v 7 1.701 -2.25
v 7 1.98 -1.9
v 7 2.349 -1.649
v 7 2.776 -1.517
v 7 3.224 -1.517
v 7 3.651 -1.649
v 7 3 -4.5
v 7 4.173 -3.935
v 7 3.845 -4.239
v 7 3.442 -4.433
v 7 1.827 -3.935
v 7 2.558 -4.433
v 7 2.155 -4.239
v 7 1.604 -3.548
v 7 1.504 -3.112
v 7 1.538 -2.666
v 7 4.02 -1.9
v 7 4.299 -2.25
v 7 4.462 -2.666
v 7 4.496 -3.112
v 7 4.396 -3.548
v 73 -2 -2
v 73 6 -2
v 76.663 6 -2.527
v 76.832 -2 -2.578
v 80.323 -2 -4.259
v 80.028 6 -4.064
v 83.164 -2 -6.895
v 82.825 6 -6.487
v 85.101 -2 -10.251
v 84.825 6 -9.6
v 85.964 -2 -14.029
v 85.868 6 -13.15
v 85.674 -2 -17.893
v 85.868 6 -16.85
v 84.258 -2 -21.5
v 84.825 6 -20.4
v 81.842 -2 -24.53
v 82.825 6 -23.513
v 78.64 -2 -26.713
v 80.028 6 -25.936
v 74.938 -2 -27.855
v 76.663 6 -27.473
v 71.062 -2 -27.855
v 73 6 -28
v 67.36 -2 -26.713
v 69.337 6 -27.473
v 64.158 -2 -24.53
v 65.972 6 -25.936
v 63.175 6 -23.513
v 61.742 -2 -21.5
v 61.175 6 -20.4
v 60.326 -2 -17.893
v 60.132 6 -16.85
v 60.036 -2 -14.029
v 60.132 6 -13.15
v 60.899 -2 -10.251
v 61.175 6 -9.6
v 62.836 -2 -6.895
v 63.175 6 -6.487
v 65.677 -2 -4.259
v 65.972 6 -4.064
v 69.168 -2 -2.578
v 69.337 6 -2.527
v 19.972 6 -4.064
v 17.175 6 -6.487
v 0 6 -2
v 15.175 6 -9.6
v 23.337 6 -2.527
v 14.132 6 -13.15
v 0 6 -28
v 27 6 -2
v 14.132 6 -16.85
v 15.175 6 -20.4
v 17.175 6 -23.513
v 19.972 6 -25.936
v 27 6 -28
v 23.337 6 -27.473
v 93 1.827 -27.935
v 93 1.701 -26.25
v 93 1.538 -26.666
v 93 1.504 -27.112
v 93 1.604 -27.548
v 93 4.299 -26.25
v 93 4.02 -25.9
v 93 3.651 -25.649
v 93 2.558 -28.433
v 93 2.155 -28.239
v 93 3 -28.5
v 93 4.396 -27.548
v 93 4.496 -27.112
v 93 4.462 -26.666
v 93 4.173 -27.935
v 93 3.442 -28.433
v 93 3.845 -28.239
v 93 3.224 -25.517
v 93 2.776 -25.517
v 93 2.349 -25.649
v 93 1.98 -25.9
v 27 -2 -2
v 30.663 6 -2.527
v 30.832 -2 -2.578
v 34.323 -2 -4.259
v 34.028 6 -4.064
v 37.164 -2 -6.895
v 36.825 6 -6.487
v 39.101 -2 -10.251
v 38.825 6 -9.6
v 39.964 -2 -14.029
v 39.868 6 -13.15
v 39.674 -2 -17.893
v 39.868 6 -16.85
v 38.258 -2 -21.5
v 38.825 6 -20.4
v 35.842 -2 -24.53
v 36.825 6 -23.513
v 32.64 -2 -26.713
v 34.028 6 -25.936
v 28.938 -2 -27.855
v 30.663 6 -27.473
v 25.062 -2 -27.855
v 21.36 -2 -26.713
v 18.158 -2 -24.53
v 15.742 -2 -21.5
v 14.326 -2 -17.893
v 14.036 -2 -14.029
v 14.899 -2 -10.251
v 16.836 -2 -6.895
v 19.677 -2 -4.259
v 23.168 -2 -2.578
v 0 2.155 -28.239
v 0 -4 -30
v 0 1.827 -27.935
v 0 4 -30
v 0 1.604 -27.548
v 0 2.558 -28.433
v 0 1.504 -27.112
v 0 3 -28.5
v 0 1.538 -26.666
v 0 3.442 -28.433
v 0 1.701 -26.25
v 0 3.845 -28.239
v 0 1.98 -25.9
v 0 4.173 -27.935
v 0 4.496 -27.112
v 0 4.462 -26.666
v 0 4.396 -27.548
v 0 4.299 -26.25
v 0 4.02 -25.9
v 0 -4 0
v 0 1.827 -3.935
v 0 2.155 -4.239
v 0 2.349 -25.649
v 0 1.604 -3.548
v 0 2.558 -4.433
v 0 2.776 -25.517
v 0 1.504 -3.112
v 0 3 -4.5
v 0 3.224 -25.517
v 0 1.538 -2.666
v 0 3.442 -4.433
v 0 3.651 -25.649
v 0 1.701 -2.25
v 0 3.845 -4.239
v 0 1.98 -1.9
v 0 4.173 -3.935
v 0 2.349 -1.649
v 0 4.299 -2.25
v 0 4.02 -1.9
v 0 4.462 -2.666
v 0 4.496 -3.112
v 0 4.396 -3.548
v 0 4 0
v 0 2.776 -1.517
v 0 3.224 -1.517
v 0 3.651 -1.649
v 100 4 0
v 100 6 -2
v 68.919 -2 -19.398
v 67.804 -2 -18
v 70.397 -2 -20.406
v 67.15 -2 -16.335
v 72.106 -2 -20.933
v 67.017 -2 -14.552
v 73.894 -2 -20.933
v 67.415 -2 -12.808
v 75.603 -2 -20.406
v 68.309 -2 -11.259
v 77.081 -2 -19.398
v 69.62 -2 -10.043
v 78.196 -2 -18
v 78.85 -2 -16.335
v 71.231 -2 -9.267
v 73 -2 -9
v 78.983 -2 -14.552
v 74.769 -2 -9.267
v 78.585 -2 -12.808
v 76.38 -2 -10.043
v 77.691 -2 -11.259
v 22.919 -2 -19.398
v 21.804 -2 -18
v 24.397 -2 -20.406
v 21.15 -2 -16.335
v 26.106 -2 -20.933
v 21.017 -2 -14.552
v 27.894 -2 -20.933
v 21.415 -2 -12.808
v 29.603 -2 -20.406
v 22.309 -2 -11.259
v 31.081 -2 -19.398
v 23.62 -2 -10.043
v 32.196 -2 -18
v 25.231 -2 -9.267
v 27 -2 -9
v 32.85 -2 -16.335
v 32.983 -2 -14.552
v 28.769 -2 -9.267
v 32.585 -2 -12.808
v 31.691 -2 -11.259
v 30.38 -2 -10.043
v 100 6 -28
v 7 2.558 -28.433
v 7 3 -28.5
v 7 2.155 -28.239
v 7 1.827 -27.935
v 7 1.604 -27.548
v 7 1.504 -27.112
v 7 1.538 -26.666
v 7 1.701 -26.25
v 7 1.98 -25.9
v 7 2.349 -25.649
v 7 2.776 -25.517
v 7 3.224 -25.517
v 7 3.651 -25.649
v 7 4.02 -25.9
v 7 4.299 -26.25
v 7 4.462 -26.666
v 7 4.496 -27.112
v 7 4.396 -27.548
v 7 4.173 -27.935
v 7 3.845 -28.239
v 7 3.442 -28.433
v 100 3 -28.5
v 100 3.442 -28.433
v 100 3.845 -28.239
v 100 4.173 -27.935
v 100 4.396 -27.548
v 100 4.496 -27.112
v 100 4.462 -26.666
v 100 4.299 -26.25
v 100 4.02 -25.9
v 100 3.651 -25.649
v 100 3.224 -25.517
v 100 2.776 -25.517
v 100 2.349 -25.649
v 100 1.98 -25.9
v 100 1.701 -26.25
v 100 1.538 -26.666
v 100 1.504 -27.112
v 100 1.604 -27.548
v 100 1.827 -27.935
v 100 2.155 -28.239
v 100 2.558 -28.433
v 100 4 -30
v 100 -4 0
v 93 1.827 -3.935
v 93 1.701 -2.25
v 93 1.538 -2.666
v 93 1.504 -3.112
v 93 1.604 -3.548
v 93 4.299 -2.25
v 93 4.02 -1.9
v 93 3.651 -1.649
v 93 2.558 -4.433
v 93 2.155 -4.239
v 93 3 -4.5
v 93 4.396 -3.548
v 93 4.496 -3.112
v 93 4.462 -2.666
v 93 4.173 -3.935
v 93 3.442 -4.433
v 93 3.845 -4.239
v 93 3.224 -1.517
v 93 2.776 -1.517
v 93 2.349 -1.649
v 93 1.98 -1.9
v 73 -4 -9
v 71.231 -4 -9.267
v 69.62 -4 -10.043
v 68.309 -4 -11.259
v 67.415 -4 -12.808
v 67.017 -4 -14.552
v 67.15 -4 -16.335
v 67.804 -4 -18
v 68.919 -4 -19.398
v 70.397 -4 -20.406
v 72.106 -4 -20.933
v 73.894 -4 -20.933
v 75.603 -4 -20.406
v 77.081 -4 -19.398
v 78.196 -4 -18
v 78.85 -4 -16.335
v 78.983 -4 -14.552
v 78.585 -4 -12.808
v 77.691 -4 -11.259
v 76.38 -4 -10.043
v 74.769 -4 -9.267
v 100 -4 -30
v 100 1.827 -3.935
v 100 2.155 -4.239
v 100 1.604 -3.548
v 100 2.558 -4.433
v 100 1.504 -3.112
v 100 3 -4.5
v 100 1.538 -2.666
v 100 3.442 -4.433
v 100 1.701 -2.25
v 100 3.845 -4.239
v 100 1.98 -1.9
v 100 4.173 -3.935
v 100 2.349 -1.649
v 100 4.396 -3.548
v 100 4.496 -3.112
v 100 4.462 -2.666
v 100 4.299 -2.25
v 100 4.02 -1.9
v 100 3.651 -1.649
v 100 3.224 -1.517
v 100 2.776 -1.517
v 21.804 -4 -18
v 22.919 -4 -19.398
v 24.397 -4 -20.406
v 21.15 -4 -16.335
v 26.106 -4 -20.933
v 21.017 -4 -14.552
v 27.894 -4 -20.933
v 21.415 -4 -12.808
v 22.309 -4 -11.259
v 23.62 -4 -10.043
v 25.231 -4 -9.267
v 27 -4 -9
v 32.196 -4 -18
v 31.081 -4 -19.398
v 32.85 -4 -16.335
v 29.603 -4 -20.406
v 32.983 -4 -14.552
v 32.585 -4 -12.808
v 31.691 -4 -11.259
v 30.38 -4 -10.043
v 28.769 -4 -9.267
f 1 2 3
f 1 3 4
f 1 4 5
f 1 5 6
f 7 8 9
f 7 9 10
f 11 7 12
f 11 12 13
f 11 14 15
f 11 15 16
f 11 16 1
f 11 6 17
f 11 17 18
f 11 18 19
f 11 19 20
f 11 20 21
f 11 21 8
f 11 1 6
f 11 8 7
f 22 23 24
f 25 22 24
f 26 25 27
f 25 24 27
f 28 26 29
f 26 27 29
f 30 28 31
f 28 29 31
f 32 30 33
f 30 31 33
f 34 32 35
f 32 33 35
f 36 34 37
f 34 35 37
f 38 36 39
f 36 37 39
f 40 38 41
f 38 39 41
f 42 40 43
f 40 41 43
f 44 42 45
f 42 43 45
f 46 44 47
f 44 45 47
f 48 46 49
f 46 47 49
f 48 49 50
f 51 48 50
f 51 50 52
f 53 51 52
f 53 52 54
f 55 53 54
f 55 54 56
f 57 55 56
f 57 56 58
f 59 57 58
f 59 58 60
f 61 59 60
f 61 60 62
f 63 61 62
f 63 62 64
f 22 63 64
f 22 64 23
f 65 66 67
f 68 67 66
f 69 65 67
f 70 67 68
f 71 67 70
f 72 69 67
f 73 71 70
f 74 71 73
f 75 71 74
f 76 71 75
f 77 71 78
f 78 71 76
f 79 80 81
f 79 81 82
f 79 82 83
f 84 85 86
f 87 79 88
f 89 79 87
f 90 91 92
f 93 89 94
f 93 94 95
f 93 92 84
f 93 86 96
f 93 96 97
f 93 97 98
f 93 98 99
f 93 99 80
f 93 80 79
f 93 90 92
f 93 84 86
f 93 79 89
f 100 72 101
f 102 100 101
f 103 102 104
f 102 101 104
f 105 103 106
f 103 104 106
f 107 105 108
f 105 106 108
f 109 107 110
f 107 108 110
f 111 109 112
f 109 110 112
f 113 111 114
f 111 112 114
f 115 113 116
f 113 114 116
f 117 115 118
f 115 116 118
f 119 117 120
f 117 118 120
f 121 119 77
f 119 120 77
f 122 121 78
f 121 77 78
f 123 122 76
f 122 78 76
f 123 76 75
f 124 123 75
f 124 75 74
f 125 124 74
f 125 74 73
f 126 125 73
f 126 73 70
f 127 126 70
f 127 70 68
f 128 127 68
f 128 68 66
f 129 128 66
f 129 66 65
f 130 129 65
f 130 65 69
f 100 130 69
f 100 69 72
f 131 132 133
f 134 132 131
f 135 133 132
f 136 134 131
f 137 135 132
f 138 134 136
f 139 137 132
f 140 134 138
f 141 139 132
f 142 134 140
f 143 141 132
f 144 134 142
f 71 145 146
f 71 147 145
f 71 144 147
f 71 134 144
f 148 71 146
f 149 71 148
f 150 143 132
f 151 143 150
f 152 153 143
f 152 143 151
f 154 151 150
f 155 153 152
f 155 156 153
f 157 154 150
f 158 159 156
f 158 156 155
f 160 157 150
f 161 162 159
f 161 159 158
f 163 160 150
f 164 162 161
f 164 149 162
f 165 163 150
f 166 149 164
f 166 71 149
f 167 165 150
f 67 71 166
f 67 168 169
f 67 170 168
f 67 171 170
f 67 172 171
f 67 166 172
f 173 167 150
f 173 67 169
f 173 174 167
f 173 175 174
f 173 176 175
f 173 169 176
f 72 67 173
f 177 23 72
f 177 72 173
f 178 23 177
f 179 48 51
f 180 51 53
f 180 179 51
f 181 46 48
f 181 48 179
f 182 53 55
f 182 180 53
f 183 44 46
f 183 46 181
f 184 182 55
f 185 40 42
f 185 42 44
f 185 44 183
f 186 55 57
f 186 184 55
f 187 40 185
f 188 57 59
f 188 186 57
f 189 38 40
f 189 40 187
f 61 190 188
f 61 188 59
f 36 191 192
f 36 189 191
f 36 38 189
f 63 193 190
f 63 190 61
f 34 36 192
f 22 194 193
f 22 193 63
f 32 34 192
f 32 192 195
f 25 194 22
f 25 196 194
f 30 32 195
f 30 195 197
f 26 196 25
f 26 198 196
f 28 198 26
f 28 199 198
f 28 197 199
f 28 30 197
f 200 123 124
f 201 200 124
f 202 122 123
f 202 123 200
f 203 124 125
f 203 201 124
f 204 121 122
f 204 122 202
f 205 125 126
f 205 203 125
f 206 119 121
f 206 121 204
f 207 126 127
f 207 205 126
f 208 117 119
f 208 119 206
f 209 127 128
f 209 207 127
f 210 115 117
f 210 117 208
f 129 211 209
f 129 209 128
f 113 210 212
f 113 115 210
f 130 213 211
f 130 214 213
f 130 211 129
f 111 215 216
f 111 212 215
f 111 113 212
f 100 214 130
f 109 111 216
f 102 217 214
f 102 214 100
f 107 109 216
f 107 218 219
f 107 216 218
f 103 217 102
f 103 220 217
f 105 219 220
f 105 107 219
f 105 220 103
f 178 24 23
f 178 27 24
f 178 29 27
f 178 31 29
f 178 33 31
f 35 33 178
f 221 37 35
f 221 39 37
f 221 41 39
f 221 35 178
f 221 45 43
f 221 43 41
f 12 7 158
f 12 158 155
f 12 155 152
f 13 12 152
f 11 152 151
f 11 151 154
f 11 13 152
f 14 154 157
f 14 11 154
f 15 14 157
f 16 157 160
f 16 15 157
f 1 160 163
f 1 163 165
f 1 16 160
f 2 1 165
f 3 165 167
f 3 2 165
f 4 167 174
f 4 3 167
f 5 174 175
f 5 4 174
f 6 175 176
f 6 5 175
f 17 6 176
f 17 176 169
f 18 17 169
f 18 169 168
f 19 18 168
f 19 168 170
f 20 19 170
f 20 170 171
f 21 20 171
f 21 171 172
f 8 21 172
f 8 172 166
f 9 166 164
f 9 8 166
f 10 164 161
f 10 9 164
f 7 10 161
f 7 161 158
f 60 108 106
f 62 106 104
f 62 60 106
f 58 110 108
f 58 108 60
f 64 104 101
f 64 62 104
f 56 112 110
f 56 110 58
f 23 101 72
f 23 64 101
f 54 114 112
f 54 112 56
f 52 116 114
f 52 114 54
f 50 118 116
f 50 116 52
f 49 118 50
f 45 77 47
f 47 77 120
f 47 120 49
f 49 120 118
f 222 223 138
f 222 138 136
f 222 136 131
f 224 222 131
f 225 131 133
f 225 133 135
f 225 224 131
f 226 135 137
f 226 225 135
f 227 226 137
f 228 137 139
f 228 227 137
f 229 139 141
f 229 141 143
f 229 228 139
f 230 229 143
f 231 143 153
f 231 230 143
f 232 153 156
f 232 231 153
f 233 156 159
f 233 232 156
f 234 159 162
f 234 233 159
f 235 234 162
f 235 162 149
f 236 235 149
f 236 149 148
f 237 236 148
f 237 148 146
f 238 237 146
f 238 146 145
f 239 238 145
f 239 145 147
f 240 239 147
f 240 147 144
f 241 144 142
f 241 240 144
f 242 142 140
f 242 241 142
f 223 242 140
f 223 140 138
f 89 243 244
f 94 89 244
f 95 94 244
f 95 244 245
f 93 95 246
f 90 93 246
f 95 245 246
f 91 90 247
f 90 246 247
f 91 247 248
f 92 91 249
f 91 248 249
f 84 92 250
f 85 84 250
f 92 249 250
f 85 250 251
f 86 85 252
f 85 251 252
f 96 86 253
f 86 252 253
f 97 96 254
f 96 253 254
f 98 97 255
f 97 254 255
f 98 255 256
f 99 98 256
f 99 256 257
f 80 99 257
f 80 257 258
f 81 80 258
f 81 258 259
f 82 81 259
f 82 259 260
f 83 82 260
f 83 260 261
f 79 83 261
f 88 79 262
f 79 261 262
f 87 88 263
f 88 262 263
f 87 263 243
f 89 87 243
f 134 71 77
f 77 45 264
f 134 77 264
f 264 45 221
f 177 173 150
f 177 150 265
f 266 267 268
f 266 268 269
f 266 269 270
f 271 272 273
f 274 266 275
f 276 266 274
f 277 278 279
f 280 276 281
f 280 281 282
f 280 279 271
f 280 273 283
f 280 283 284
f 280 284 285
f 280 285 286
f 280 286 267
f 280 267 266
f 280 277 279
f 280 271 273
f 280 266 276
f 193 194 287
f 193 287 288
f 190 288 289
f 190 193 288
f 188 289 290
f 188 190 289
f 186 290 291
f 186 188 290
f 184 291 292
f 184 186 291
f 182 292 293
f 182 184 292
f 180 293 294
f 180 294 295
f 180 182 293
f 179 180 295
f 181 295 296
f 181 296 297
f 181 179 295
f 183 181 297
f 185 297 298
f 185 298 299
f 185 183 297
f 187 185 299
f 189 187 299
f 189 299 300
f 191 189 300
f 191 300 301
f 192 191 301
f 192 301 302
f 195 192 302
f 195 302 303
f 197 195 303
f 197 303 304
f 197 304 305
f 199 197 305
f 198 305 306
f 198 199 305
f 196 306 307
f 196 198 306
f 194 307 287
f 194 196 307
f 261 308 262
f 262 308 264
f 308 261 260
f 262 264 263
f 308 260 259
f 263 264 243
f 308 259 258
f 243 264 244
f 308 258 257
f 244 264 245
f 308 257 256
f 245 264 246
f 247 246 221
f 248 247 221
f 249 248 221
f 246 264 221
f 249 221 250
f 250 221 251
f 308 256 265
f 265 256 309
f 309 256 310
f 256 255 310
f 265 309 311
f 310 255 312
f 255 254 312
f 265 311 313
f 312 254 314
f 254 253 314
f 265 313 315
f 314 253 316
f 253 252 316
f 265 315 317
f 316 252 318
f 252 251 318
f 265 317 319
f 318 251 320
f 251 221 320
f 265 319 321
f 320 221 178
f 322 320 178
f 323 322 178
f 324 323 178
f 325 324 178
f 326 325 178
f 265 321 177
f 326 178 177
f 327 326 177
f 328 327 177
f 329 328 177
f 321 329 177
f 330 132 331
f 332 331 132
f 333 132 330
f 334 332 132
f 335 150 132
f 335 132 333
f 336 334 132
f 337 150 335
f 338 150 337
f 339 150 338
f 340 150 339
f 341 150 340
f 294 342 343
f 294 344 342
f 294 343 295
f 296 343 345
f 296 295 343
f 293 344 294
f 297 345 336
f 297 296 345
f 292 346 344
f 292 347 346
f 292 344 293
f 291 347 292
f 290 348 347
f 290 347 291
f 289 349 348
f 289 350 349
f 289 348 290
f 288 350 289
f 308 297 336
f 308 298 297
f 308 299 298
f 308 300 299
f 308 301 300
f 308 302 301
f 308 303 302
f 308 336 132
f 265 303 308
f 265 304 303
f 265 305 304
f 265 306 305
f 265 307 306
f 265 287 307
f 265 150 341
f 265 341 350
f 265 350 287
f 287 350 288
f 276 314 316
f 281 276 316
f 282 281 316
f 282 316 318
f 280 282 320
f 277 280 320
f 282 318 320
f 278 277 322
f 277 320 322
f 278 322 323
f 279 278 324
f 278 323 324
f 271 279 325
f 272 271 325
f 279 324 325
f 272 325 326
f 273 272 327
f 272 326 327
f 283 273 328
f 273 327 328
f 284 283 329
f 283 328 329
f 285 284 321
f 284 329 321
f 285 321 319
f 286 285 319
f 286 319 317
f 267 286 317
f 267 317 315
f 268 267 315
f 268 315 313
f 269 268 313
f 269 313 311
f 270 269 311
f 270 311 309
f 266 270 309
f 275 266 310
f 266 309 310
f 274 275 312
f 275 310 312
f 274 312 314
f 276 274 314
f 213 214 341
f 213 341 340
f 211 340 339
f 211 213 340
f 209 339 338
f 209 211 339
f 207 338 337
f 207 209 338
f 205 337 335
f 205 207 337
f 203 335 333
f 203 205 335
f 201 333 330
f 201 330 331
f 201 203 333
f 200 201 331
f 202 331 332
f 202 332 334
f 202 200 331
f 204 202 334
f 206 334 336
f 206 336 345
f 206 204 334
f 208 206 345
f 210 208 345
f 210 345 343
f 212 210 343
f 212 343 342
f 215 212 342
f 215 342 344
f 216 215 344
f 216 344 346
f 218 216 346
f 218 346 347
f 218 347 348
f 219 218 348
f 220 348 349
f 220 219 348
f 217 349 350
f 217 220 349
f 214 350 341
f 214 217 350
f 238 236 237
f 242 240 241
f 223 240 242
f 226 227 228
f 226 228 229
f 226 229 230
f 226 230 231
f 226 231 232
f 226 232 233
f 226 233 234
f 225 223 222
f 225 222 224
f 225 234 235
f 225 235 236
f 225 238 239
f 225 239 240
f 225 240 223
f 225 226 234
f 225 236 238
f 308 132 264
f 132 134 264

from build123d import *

# Parameters (mm, degrees)
SKETCH1_W           = 100
SKETCH1_H           = 30
BOSS_EXTRUDE1_DEPTH = 6
SKETCH2_R           = 6
CUT_EXTRUDE1_DEPTH  = 105.575331699
CHAMFER1_SIZE       = 2
SKETCH3_R           = 1.5
CUT_EXTRUDE2_DEPTH  = 7
CUT_EXTRUDE3_START  = -7
SKETCH4_R           = 1.5
CUT_EXTRUDE3_DEPTH  = 7
SKETCH5_W           = 100
SKETCH5_H           = 30
SKETCH5_R           = 6
BOSS_EXTRUDE2_DEPTH = 4
SKETCH6_R           = 13
CUT_EXTRUDE4_DEPTH  = 8


with BuildPart() as part:
    # Sketch1 → Boss-Extrude1 (new body)
    with BuildSketch(Plane(origin=(0, 0, 0), x_dir=(1, 0, 0), z_dir=(0, 1, 0))):
        with Locations((50, 15)):
            Rectangle(SKETCH1_W, SKETCH1_H)
    extrude(amount=BOSS_EXTRUDE1_DEPTH)

    # Sketch2 → Cut-Extrude1 (cut, through all)
    with BuildSketch(Plane(origin=(0, 6, 0), x_dir=(1, 0, 0), z_dir=(0, 1, 0))):
        with Locations(Location((27, 15, 0), (0, 0, 270))):
            Circle(SKETCH2_R)
        with Locations(Location((73, 15, 0), (0, 0, 270))):
            Circle(SKETCH2_R)
    extrude(amount=-CUT_EXTRUDE1_DEPTH, mode=Mode.SUBTRACT)

    # Chamfer1
    chamfer1_edges = [part.edges().sort_by_distance(p)[0] for p in [
        (50, 6, -30),
        (50, 6, 0),
    ]]
    chamfer(chamfer1_edges, length=CHAMFER1_SIZE)

    # Sketch3 → Cut-Extrude2 (cut)
    with BuildSketch(Plane(origin=(100, 0, 0), x_dir=(0, 0, -1), z_dir=(1, 0, 0))):
        with Locations((3, 3)):
            Circle(SKETCH3_R)
        with Locations((27, 3)):
            Circle(SKETCH3_R)
    extrude(amount=-CUT_EXTRUDE2_DEPTH, mode=Mode.SUBTRACT)

    # Sketch4 → Cut-Extrude3 (cut)
    with BuildSketch(Plane.ZY.offset(CUT_EXTRUDE3_START)):
        with Locations(Location((-27, 3, 0), (0, 0, 180))):
            Circle(SKETCH4_R)
        with Locations(Location((-3, 3, 0), (0, 0, 180))):
            Circle(SKETCH4_R)
    extrude(amount=CUT_EXTRUDE3_DEPTH, mode=Mode.SUBTRACT)

    # Sketch5 → Boss-Extrude2 (add)
    with BuildSketch(Plane.XZ):
        with Locations((50, -15)):
            Rectangle(SKETCH5_W, SKETCH5_H)
        with Locations(Location((27, -15, 0), (0, 0, 90))):
            Circle(SKETCH5_R, mode=Mode.SUBTRACT)
        with Locations(Location((73, -15, 0), (0, 0, 90))):
            Circle(SKETCH5_R, mode=Mode.SUBTRACT)
    extrude(amount=BOSS_EXTRUDE2_DEPTH)

    # Sketch6 → Cut-Extrude4 (cut)
    with BuildSketch(Plane(origin=(0, 6, 0), x_dir=(1, 0, 0), z_dir=(0, 1, 0))):
        with Locations(Location((27, 15, 0), (0, 0, 270))):
            Circle(SKETCH6_R)
        with Locations(Location((73, 15, 0), (0, 0, 270))):
            Circle(SKETCH6_R)
    extrude(amount=-CUT_EXTRUDE4_DEPTH, mode=Mode.SUBTRACT)


solid = part.part
